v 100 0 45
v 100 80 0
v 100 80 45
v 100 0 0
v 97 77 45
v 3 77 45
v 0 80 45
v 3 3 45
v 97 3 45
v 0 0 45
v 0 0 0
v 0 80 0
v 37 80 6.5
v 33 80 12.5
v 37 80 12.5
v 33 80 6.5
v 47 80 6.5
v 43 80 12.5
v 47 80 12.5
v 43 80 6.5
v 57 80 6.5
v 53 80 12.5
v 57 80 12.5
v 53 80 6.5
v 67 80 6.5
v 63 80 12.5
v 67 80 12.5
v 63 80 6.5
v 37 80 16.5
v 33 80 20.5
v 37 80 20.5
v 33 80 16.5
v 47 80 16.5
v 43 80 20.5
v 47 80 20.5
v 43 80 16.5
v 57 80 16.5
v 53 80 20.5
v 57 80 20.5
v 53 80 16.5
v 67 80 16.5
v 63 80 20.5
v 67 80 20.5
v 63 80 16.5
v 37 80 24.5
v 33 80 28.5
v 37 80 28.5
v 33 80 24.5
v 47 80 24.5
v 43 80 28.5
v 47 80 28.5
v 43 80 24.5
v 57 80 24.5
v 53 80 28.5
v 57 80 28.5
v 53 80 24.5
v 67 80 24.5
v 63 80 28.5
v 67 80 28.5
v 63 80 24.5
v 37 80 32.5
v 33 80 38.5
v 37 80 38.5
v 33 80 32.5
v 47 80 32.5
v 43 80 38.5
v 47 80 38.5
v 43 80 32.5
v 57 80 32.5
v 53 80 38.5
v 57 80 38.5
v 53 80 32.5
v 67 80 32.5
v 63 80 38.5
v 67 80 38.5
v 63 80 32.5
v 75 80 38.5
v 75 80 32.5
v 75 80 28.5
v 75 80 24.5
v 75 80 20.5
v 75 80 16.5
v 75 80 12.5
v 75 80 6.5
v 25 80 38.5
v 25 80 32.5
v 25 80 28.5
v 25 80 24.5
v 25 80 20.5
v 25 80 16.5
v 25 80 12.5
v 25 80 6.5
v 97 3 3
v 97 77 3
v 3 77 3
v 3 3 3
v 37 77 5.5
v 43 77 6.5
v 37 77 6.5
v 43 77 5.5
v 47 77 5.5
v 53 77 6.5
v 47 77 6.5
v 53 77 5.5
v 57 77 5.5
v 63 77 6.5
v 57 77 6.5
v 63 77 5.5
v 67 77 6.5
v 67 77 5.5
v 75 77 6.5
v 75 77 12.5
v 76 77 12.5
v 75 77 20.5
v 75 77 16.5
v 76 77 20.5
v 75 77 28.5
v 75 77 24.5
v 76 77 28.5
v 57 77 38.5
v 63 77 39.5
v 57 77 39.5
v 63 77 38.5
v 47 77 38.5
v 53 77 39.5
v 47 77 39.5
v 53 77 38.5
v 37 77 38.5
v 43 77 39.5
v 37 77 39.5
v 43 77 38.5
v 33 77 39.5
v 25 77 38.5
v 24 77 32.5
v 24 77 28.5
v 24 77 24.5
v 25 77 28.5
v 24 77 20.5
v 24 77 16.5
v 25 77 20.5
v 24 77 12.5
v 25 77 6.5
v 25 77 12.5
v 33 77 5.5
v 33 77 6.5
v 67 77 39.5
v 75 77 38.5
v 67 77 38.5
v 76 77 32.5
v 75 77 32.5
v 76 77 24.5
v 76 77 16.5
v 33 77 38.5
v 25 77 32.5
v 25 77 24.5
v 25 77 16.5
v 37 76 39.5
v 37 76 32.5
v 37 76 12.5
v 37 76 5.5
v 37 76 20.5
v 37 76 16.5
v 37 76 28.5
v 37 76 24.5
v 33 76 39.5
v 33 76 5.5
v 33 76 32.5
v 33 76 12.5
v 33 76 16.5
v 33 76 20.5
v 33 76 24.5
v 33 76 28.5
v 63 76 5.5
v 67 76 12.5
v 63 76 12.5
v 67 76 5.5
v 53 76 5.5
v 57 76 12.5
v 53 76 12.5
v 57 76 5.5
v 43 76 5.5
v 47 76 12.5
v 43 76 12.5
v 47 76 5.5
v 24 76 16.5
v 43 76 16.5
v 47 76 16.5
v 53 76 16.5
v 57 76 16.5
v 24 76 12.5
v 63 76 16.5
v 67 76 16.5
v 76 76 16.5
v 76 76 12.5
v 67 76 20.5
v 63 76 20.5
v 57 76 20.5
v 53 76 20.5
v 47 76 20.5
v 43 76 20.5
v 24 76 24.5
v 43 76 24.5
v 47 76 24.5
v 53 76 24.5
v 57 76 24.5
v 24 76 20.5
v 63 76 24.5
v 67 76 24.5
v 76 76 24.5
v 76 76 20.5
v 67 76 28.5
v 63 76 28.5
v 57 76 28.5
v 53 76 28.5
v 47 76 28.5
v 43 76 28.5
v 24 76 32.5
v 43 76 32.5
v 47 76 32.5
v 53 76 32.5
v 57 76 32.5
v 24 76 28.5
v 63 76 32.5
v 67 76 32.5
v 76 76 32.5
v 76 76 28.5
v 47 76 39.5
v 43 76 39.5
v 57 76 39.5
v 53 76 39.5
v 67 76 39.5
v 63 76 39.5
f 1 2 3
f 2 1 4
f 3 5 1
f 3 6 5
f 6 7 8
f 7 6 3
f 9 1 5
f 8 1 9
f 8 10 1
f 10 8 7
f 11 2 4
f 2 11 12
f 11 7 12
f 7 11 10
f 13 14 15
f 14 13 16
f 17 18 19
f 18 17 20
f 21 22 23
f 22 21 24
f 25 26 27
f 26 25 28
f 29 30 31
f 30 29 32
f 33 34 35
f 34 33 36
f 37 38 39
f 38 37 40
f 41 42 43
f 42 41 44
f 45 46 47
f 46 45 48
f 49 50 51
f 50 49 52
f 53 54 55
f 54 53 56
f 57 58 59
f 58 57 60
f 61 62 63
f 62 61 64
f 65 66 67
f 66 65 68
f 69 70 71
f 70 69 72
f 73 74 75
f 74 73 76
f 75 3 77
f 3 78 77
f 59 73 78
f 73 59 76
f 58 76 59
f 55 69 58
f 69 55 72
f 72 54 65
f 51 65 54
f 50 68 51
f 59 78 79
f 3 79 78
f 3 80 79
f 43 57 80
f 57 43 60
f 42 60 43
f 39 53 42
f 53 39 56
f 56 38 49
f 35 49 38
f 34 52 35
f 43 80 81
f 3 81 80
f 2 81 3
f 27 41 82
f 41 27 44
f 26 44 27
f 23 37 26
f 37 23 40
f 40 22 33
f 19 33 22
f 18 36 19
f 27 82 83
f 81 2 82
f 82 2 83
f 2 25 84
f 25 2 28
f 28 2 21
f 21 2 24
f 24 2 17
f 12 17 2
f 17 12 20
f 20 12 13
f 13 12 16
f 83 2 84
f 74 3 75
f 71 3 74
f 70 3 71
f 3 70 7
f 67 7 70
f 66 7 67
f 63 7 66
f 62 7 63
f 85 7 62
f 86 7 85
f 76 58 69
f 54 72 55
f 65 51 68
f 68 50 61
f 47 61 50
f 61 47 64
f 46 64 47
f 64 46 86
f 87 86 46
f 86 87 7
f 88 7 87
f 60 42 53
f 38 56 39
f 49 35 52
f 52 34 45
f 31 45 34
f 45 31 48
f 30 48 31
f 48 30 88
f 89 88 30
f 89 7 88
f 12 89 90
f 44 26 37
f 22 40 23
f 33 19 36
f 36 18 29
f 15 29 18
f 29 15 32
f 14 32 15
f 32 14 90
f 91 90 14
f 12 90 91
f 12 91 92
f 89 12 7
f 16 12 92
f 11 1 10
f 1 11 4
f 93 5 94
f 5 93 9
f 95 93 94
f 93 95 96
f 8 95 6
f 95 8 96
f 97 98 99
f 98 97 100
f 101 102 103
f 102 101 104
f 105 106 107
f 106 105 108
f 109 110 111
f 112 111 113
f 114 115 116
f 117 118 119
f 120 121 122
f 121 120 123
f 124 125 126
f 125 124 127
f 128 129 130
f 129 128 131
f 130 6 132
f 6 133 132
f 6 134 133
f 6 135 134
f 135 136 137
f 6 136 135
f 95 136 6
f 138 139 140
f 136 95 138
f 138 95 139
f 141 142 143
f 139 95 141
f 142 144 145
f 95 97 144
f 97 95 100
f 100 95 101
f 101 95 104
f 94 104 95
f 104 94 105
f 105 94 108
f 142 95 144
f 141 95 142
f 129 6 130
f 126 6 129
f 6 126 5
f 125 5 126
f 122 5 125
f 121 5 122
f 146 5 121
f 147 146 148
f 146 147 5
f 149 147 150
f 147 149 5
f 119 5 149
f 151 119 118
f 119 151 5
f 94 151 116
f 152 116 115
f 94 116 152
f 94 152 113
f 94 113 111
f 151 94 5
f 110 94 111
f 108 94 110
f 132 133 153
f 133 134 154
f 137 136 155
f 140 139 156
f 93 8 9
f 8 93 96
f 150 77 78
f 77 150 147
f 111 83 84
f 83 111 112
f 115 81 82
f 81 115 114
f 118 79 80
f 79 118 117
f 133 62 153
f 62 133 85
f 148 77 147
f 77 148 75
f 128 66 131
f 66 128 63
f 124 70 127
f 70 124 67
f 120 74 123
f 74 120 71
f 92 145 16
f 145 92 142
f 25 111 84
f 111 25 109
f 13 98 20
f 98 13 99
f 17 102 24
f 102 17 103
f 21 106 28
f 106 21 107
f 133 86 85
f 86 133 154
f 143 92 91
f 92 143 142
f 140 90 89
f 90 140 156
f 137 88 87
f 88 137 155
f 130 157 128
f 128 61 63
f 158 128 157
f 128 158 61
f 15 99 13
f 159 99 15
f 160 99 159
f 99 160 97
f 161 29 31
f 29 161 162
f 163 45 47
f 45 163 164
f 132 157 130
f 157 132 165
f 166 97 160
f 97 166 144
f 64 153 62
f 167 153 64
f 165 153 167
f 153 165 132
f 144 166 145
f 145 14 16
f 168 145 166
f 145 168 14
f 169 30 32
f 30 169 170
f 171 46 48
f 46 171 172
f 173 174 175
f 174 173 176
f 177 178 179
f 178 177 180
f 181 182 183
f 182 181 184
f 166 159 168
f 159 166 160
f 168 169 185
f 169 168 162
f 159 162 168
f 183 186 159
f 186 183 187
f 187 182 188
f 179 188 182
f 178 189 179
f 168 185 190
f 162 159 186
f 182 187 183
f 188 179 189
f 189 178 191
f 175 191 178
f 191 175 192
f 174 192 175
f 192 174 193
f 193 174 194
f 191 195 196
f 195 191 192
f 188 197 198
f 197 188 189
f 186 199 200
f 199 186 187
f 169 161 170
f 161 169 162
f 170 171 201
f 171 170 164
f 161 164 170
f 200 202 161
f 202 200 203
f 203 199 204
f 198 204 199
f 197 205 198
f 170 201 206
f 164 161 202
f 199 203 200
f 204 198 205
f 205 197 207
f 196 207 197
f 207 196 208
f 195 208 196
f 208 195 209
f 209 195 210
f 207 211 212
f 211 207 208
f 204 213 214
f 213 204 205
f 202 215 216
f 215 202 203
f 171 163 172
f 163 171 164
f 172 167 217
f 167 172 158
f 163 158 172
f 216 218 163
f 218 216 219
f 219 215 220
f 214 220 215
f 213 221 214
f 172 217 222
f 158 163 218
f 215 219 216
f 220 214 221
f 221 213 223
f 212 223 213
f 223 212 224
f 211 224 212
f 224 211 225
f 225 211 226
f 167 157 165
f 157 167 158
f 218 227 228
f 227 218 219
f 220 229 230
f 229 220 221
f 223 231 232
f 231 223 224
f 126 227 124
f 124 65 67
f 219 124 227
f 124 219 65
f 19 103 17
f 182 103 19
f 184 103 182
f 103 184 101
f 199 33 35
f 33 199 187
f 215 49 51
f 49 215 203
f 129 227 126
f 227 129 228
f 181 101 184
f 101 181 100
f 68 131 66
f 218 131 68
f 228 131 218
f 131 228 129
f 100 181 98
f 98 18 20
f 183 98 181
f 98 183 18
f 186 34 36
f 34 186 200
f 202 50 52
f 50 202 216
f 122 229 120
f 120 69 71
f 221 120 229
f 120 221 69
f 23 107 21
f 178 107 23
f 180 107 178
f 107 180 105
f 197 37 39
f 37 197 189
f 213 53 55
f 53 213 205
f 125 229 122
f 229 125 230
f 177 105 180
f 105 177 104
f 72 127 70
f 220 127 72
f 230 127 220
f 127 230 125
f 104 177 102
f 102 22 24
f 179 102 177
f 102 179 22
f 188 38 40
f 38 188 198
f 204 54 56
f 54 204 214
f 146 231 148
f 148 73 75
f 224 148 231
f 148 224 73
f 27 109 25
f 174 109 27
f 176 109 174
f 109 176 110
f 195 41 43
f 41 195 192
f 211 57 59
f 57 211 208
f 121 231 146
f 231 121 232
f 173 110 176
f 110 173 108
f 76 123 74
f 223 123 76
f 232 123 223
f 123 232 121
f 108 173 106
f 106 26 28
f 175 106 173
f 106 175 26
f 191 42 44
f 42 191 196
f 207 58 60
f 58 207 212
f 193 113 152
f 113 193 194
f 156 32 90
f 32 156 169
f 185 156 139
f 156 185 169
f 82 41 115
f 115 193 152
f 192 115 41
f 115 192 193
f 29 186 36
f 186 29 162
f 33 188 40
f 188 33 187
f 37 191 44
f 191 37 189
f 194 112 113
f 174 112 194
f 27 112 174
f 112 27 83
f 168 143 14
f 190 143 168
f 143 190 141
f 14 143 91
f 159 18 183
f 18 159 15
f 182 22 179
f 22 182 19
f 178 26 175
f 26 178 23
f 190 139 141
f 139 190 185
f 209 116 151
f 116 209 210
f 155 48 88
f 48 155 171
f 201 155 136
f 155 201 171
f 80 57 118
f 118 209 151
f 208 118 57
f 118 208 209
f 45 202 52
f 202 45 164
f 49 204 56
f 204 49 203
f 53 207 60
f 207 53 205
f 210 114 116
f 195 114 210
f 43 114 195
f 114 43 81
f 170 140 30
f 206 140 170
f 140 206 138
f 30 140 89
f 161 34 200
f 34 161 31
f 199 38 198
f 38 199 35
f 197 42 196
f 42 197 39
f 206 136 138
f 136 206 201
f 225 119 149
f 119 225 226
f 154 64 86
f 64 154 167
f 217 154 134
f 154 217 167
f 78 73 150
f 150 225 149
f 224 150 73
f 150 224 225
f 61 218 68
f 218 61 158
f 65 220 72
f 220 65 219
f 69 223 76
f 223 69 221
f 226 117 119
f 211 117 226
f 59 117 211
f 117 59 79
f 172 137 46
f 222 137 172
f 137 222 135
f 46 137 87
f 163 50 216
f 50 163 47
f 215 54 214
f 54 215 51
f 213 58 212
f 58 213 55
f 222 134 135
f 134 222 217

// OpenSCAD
$fn = 32;

// ----------------------------------------------------------------------
// Vent box: crossgrid enclosure
// ----------------------------------------------------------------------

// --- parameters (mm) ---
box_l = 100;              // box length, X
box_w = 80;               // box width, Y
box_h = 45;               // box height, Z
wall_t = 3;               // shell wall thickness
win_l = 50;               // vent window width, X
win_h = 32;               // vent window height, Z
bar_w = 4;                // grid bar width
n_v = 4;                  // vertical bar count
n_h = 3;                  // horizontal bar count

win_z0 = (box_h - win_h) / 2;  // window lower edge Z
v_step = win_l / (n_v + 1);  // vertical bar step
h_step = win_h / (n_h + 1);  // horizontal bar step

difference() {
  union() {
    difference() {
      cube([box_l, box_w, box_h]);
  translate([wall_t, wall_t, wall_t])
    cube([box_l - 2 * wall_t, box_w - 2 * wall_t, box_h]);
  translate([(box_l - win_l) / 2, box_w - wall_t - 1, win_z0])
    cube([win_l, wall_t + 2, win_h]);
    }
    for (i = [1 : n_v])
      translate([(box_l - win_l) / 2 + i * v_step - bar_w / 2,
                 box_w - wall_t - 1, win_z0 - 1])
        cube([bar_w, wall_t + 1, win_h + 2]);
    for (i = [1 : n_h])
      translate([(box_l - win_l) / 2 - 1, box_w - wall_t - 1,
                 win_z0 + i * h_step - bar_w / 2])
        cube([win_l + 2, wall_t + 1, bar_w]);
  }
}
